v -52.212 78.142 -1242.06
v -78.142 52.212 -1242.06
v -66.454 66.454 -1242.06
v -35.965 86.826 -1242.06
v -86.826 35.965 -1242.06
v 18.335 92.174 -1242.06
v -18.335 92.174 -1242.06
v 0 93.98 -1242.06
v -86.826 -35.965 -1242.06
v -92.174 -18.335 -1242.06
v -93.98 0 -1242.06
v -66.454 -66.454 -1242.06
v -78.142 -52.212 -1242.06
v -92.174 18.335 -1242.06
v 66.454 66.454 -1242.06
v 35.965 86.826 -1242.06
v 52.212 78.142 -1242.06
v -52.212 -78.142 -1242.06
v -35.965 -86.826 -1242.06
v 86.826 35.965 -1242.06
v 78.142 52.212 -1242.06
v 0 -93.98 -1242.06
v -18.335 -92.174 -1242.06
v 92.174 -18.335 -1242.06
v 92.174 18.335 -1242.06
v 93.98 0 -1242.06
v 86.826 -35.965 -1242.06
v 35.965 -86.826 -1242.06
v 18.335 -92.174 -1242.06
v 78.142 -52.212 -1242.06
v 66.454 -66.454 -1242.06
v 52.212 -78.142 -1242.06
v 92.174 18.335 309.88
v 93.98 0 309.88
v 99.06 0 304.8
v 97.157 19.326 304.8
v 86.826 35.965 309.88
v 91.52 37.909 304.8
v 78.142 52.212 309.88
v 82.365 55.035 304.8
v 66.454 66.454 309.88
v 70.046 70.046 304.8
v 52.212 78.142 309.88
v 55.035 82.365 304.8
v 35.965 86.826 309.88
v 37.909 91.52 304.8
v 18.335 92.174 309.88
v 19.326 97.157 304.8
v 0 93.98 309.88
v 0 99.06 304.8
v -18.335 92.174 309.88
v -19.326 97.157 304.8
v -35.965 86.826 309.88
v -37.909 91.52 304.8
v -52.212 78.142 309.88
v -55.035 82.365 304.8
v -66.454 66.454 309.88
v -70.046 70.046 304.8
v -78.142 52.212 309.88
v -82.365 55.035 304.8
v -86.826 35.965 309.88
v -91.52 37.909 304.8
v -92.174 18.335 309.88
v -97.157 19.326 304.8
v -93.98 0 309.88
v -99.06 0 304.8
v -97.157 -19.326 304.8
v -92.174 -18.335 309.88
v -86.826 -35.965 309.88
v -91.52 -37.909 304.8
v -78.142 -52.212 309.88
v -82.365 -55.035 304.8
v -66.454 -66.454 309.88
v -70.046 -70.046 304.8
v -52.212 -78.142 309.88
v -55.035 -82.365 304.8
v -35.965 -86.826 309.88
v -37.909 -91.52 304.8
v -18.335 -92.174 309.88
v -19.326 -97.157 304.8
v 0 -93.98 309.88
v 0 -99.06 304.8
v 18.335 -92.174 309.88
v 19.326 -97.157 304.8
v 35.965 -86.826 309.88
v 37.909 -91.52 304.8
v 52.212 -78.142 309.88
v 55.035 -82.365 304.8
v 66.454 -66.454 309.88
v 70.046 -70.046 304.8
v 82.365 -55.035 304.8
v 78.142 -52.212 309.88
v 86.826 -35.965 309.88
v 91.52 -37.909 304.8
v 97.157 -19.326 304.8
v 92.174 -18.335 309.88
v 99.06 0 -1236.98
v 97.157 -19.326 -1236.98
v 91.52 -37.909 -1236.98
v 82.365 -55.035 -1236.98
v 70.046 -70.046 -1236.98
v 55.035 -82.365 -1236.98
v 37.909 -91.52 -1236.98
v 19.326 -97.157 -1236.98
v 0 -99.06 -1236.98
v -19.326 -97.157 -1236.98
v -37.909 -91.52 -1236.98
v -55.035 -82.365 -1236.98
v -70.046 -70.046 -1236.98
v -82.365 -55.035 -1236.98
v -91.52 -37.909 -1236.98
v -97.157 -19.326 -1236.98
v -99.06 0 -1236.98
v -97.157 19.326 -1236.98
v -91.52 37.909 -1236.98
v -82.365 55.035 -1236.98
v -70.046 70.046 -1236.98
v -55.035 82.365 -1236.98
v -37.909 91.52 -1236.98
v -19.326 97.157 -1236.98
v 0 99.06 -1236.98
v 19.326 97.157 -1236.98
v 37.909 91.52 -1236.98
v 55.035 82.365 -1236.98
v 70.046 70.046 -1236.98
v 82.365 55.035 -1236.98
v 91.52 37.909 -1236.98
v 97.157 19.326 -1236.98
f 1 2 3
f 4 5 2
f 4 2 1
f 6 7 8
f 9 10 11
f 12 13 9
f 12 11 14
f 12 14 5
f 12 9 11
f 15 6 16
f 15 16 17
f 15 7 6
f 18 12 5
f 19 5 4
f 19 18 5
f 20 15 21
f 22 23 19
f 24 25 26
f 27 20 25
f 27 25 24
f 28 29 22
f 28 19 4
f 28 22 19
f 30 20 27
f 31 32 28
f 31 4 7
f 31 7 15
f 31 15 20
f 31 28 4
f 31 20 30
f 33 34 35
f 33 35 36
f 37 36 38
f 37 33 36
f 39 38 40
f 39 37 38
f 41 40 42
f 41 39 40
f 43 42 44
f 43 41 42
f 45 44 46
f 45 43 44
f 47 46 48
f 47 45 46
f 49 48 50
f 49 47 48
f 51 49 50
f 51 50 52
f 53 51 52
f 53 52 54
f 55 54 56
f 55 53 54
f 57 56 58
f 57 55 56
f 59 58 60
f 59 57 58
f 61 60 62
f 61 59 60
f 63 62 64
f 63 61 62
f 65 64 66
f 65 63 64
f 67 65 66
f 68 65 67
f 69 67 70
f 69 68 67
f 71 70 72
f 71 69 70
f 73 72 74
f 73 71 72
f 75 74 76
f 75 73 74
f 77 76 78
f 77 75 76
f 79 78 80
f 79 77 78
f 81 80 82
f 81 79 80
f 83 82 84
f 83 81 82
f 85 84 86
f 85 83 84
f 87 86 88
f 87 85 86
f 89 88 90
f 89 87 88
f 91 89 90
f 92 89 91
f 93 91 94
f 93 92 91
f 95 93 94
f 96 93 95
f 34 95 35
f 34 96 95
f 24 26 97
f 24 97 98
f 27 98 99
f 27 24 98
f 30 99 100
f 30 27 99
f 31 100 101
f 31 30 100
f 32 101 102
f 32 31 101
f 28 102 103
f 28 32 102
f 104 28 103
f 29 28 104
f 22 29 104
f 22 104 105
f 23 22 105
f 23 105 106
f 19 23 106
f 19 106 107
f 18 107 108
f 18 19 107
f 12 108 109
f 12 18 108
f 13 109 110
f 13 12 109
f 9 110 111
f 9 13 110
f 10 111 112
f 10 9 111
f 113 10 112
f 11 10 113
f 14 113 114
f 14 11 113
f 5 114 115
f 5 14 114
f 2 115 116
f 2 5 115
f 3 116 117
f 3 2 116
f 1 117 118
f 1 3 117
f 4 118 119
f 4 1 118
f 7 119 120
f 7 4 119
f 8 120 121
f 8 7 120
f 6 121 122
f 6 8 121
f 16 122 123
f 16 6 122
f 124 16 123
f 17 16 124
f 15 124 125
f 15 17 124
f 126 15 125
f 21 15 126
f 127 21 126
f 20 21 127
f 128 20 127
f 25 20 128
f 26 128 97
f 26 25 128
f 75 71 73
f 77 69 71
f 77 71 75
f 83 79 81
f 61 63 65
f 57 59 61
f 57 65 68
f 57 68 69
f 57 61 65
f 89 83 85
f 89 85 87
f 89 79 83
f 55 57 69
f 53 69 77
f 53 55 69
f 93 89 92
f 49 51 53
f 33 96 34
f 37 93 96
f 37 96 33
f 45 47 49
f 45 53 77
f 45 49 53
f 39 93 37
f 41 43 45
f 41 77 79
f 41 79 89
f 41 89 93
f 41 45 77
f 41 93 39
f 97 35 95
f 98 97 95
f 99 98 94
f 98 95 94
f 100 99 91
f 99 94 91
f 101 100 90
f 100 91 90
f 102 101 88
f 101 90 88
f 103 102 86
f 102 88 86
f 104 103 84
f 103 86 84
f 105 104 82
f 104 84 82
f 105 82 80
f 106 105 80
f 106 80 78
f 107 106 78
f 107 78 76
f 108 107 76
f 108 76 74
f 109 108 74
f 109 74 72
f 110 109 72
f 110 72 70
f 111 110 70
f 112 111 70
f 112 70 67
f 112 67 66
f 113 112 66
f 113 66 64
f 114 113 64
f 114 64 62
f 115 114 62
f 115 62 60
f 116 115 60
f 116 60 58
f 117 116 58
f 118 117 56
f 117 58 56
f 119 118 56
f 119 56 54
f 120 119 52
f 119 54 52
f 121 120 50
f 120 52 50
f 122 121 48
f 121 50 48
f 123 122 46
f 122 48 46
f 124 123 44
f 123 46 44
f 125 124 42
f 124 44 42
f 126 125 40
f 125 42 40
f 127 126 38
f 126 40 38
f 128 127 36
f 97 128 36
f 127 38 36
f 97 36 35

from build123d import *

# Parameters (mm, degrees)
F0_R      = 99.06
F1_DEPTH  = 309.88
F1_FACE_R = 99.06
F2_DEPTH  = 1242.06
F3_SIZE   = 5.08
F4_SIZE   = 5.08


with BuildPart() as f1:
    # F0 (on Top) → F1 (new body)
    with BuildSketch(Plane.XY):
        Circle(F0_R)
    extrude(amount=F1_DEPTH)

    # F1_face (on face) → F2 (join)
    with BuildSketch(Plane(origin=(0, 0, 0), x_dir=(1, 0, 0), z_dir=(0, 0, -1))):
        Circle(F1_FACE_R)
    extrude(amount=F2_DEPTH)

    # F3
    f3_edges = [f1.edges().sort_by_distance(p)[0] for p in [
        (-99.06, 0, -1242.06),
    ]]
    chamfer(f3_edges, length=F3_SIZE)

    # F4
    f4_edges = [f1.edges().sort_by_distance(p)[0] for p in [
        (-99.06, 0, 309.88),
    ]]
    chamfer(f4_edges, length=F4_SIZE)


solid = f1.part
